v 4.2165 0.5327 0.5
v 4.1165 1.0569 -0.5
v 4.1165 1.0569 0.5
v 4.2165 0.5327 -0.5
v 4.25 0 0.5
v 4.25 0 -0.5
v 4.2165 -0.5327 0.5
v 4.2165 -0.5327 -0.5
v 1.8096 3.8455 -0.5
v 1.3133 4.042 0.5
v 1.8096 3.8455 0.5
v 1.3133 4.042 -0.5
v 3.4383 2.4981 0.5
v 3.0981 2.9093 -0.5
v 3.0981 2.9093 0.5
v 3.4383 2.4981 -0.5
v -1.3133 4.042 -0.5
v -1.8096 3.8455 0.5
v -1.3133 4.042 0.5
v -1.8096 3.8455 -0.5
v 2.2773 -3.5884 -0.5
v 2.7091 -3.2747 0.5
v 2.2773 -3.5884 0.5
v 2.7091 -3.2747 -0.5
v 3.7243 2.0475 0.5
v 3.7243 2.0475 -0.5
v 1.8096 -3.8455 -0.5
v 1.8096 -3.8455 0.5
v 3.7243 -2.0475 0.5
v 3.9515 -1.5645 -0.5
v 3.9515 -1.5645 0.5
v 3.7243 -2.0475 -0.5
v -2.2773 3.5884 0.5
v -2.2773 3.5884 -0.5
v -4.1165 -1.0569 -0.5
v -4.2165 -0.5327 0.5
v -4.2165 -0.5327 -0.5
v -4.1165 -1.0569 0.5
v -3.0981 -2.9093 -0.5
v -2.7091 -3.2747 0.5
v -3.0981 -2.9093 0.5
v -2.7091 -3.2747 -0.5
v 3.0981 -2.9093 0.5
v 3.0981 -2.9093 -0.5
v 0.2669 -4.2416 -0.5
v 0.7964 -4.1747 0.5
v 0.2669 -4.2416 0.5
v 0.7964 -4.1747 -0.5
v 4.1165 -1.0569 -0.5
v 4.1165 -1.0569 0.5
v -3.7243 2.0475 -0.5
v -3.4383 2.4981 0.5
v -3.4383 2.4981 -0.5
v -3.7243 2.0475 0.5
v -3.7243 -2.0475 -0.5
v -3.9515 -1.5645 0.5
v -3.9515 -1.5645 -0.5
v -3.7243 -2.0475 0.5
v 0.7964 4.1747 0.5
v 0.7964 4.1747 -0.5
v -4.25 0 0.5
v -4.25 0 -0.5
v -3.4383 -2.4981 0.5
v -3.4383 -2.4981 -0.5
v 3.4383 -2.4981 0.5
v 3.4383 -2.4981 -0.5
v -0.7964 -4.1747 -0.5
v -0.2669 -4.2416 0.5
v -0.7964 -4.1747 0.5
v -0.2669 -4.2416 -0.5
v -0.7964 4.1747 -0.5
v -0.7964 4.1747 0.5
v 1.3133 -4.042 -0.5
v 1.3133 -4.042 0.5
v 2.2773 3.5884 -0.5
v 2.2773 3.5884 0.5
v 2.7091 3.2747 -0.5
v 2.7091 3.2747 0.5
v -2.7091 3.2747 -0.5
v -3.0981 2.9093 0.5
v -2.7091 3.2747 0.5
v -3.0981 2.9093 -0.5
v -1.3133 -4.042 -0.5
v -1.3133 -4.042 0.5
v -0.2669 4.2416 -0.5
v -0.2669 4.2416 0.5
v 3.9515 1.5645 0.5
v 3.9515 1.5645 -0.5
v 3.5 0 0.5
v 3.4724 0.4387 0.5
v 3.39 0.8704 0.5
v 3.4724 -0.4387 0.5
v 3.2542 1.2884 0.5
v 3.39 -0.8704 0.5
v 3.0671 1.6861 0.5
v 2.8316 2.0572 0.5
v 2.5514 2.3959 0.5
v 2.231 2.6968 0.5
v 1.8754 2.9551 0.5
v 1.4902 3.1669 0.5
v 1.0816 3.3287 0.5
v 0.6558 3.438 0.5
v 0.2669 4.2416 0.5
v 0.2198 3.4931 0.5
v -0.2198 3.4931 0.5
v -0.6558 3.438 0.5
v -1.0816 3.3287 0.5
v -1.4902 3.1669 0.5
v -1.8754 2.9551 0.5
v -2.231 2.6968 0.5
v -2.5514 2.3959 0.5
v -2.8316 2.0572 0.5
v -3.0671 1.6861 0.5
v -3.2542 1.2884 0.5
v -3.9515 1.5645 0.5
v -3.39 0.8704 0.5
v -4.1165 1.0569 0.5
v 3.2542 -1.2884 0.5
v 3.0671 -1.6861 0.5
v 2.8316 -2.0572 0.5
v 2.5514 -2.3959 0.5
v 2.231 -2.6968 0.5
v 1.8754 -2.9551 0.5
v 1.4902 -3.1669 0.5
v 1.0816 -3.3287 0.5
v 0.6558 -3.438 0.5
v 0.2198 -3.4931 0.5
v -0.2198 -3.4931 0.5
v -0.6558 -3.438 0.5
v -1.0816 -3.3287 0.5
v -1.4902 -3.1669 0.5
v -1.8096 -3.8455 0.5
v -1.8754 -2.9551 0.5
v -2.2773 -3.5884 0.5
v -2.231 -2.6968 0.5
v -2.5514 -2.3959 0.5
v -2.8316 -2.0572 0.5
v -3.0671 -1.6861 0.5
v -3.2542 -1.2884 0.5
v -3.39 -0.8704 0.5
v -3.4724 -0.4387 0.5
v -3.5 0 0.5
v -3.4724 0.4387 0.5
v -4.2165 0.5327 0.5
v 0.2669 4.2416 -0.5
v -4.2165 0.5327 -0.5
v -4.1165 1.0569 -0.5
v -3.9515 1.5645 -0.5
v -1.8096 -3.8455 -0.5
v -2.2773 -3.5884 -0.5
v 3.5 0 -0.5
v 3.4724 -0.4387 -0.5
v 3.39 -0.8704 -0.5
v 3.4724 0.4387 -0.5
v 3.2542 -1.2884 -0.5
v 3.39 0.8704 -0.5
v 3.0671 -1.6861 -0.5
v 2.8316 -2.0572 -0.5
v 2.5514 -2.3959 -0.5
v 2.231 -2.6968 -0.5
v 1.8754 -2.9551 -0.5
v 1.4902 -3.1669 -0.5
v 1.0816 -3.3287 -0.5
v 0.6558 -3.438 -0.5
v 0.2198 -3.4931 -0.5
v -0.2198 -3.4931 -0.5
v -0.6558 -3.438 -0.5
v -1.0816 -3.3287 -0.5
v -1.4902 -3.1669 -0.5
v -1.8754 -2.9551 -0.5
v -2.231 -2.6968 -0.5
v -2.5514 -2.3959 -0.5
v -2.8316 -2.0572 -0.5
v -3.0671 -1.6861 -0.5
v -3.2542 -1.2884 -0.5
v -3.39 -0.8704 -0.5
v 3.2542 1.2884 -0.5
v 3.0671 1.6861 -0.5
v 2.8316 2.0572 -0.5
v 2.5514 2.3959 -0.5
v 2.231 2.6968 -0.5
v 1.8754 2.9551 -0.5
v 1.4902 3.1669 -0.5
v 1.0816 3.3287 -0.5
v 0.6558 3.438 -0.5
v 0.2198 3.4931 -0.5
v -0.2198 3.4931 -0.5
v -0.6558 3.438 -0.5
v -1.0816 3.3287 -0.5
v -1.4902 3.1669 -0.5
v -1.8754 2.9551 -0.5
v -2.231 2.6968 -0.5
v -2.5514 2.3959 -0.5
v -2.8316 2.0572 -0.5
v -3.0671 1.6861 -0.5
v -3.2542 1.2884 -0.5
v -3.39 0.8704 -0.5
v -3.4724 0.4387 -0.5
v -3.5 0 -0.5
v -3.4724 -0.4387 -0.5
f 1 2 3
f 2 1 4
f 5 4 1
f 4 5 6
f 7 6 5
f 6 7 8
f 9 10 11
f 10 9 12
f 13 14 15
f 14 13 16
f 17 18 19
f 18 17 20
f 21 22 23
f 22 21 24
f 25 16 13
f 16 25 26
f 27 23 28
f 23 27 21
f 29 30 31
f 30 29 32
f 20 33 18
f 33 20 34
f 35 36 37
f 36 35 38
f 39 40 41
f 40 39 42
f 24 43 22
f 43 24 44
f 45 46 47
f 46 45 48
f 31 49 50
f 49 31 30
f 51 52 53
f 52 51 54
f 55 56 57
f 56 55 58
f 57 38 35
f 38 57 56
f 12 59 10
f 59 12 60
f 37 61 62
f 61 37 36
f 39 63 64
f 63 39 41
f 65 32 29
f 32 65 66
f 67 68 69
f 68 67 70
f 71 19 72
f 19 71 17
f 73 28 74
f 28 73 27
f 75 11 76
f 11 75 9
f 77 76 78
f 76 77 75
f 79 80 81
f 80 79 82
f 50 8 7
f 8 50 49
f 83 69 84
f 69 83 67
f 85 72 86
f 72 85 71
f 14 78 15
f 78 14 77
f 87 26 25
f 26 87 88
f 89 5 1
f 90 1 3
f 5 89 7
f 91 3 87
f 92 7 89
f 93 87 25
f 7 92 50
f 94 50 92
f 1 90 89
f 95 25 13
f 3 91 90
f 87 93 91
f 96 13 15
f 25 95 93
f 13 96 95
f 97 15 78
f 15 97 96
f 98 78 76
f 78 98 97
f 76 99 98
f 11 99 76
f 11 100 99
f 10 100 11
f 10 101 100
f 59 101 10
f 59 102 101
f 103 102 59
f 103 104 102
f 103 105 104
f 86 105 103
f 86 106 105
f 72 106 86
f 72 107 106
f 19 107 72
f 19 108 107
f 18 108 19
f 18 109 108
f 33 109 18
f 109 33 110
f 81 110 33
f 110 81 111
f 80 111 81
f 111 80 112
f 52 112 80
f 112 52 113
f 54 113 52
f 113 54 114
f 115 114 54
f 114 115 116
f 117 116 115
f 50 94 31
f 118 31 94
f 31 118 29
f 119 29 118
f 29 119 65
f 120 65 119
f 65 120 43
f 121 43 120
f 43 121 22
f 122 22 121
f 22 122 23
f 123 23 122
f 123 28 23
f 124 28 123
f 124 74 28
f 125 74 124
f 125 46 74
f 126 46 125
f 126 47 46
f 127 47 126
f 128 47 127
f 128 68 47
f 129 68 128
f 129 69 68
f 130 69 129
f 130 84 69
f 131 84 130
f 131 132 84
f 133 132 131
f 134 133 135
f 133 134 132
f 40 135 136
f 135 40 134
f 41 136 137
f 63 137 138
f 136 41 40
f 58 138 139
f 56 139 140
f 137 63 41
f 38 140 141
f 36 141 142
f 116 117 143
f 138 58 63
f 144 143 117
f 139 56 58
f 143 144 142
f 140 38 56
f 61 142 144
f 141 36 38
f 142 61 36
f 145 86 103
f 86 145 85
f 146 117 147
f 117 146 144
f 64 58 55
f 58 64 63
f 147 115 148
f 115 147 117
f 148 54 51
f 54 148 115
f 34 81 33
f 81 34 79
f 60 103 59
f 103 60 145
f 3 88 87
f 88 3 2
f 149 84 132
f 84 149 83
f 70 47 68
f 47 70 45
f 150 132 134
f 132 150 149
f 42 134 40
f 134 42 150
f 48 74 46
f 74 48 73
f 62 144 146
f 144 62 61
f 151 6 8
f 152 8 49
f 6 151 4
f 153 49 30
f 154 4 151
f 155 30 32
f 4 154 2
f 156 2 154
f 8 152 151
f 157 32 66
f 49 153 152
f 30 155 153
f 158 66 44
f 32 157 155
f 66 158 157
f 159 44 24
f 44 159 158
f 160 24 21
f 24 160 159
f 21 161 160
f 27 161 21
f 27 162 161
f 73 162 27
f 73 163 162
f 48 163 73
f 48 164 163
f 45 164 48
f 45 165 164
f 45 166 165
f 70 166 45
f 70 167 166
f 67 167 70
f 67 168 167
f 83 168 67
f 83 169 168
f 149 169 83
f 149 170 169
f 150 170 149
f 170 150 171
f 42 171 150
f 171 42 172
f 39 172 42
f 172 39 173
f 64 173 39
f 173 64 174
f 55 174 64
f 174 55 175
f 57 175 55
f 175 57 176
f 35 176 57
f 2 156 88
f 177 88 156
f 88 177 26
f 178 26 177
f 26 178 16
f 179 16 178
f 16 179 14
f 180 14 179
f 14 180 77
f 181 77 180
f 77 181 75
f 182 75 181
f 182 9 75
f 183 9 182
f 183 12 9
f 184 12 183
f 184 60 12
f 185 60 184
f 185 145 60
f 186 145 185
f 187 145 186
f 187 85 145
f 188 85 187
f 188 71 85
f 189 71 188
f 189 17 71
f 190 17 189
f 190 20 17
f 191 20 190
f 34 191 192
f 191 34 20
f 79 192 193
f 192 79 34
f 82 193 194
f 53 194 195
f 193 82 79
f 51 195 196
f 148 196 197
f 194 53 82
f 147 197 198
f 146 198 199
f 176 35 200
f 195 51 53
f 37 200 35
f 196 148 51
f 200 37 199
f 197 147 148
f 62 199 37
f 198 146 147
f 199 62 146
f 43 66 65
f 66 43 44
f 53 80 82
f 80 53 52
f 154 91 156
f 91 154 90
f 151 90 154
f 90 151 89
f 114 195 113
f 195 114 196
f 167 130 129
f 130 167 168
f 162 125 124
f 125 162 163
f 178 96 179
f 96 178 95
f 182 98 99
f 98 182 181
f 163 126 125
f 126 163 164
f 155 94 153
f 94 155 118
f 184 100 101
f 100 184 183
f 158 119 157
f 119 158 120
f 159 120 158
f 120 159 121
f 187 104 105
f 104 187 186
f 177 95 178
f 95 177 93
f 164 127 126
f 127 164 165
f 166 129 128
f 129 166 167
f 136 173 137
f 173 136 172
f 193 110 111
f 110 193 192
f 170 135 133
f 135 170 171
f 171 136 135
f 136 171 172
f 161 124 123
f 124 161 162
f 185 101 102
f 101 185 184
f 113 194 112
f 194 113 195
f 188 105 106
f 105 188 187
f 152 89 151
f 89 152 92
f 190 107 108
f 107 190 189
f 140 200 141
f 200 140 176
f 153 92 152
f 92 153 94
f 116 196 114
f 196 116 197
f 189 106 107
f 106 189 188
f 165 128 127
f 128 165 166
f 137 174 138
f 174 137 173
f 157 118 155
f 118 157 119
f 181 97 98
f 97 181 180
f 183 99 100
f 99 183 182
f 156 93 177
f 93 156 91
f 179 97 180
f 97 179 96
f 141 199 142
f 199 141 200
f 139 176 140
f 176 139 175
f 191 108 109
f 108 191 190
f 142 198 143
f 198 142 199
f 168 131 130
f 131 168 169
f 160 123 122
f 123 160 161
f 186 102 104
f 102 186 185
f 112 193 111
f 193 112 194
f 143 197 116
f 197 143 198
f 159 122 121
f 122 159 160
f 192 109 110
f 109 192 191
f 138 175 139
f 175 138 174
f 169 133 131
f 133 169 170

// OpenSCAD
$fn = 50;


difference() {
	union() {
		translate(v = [0, 0, -0.5000000000]) {
			cylinder(h = 1, r = 4.2500000000);
		}
	}
	union() {
		translate(v = [0, 0, -100.0000000000]) {
			cylinder(h = 200, r = 3.5000000000);
		}
	}
}
